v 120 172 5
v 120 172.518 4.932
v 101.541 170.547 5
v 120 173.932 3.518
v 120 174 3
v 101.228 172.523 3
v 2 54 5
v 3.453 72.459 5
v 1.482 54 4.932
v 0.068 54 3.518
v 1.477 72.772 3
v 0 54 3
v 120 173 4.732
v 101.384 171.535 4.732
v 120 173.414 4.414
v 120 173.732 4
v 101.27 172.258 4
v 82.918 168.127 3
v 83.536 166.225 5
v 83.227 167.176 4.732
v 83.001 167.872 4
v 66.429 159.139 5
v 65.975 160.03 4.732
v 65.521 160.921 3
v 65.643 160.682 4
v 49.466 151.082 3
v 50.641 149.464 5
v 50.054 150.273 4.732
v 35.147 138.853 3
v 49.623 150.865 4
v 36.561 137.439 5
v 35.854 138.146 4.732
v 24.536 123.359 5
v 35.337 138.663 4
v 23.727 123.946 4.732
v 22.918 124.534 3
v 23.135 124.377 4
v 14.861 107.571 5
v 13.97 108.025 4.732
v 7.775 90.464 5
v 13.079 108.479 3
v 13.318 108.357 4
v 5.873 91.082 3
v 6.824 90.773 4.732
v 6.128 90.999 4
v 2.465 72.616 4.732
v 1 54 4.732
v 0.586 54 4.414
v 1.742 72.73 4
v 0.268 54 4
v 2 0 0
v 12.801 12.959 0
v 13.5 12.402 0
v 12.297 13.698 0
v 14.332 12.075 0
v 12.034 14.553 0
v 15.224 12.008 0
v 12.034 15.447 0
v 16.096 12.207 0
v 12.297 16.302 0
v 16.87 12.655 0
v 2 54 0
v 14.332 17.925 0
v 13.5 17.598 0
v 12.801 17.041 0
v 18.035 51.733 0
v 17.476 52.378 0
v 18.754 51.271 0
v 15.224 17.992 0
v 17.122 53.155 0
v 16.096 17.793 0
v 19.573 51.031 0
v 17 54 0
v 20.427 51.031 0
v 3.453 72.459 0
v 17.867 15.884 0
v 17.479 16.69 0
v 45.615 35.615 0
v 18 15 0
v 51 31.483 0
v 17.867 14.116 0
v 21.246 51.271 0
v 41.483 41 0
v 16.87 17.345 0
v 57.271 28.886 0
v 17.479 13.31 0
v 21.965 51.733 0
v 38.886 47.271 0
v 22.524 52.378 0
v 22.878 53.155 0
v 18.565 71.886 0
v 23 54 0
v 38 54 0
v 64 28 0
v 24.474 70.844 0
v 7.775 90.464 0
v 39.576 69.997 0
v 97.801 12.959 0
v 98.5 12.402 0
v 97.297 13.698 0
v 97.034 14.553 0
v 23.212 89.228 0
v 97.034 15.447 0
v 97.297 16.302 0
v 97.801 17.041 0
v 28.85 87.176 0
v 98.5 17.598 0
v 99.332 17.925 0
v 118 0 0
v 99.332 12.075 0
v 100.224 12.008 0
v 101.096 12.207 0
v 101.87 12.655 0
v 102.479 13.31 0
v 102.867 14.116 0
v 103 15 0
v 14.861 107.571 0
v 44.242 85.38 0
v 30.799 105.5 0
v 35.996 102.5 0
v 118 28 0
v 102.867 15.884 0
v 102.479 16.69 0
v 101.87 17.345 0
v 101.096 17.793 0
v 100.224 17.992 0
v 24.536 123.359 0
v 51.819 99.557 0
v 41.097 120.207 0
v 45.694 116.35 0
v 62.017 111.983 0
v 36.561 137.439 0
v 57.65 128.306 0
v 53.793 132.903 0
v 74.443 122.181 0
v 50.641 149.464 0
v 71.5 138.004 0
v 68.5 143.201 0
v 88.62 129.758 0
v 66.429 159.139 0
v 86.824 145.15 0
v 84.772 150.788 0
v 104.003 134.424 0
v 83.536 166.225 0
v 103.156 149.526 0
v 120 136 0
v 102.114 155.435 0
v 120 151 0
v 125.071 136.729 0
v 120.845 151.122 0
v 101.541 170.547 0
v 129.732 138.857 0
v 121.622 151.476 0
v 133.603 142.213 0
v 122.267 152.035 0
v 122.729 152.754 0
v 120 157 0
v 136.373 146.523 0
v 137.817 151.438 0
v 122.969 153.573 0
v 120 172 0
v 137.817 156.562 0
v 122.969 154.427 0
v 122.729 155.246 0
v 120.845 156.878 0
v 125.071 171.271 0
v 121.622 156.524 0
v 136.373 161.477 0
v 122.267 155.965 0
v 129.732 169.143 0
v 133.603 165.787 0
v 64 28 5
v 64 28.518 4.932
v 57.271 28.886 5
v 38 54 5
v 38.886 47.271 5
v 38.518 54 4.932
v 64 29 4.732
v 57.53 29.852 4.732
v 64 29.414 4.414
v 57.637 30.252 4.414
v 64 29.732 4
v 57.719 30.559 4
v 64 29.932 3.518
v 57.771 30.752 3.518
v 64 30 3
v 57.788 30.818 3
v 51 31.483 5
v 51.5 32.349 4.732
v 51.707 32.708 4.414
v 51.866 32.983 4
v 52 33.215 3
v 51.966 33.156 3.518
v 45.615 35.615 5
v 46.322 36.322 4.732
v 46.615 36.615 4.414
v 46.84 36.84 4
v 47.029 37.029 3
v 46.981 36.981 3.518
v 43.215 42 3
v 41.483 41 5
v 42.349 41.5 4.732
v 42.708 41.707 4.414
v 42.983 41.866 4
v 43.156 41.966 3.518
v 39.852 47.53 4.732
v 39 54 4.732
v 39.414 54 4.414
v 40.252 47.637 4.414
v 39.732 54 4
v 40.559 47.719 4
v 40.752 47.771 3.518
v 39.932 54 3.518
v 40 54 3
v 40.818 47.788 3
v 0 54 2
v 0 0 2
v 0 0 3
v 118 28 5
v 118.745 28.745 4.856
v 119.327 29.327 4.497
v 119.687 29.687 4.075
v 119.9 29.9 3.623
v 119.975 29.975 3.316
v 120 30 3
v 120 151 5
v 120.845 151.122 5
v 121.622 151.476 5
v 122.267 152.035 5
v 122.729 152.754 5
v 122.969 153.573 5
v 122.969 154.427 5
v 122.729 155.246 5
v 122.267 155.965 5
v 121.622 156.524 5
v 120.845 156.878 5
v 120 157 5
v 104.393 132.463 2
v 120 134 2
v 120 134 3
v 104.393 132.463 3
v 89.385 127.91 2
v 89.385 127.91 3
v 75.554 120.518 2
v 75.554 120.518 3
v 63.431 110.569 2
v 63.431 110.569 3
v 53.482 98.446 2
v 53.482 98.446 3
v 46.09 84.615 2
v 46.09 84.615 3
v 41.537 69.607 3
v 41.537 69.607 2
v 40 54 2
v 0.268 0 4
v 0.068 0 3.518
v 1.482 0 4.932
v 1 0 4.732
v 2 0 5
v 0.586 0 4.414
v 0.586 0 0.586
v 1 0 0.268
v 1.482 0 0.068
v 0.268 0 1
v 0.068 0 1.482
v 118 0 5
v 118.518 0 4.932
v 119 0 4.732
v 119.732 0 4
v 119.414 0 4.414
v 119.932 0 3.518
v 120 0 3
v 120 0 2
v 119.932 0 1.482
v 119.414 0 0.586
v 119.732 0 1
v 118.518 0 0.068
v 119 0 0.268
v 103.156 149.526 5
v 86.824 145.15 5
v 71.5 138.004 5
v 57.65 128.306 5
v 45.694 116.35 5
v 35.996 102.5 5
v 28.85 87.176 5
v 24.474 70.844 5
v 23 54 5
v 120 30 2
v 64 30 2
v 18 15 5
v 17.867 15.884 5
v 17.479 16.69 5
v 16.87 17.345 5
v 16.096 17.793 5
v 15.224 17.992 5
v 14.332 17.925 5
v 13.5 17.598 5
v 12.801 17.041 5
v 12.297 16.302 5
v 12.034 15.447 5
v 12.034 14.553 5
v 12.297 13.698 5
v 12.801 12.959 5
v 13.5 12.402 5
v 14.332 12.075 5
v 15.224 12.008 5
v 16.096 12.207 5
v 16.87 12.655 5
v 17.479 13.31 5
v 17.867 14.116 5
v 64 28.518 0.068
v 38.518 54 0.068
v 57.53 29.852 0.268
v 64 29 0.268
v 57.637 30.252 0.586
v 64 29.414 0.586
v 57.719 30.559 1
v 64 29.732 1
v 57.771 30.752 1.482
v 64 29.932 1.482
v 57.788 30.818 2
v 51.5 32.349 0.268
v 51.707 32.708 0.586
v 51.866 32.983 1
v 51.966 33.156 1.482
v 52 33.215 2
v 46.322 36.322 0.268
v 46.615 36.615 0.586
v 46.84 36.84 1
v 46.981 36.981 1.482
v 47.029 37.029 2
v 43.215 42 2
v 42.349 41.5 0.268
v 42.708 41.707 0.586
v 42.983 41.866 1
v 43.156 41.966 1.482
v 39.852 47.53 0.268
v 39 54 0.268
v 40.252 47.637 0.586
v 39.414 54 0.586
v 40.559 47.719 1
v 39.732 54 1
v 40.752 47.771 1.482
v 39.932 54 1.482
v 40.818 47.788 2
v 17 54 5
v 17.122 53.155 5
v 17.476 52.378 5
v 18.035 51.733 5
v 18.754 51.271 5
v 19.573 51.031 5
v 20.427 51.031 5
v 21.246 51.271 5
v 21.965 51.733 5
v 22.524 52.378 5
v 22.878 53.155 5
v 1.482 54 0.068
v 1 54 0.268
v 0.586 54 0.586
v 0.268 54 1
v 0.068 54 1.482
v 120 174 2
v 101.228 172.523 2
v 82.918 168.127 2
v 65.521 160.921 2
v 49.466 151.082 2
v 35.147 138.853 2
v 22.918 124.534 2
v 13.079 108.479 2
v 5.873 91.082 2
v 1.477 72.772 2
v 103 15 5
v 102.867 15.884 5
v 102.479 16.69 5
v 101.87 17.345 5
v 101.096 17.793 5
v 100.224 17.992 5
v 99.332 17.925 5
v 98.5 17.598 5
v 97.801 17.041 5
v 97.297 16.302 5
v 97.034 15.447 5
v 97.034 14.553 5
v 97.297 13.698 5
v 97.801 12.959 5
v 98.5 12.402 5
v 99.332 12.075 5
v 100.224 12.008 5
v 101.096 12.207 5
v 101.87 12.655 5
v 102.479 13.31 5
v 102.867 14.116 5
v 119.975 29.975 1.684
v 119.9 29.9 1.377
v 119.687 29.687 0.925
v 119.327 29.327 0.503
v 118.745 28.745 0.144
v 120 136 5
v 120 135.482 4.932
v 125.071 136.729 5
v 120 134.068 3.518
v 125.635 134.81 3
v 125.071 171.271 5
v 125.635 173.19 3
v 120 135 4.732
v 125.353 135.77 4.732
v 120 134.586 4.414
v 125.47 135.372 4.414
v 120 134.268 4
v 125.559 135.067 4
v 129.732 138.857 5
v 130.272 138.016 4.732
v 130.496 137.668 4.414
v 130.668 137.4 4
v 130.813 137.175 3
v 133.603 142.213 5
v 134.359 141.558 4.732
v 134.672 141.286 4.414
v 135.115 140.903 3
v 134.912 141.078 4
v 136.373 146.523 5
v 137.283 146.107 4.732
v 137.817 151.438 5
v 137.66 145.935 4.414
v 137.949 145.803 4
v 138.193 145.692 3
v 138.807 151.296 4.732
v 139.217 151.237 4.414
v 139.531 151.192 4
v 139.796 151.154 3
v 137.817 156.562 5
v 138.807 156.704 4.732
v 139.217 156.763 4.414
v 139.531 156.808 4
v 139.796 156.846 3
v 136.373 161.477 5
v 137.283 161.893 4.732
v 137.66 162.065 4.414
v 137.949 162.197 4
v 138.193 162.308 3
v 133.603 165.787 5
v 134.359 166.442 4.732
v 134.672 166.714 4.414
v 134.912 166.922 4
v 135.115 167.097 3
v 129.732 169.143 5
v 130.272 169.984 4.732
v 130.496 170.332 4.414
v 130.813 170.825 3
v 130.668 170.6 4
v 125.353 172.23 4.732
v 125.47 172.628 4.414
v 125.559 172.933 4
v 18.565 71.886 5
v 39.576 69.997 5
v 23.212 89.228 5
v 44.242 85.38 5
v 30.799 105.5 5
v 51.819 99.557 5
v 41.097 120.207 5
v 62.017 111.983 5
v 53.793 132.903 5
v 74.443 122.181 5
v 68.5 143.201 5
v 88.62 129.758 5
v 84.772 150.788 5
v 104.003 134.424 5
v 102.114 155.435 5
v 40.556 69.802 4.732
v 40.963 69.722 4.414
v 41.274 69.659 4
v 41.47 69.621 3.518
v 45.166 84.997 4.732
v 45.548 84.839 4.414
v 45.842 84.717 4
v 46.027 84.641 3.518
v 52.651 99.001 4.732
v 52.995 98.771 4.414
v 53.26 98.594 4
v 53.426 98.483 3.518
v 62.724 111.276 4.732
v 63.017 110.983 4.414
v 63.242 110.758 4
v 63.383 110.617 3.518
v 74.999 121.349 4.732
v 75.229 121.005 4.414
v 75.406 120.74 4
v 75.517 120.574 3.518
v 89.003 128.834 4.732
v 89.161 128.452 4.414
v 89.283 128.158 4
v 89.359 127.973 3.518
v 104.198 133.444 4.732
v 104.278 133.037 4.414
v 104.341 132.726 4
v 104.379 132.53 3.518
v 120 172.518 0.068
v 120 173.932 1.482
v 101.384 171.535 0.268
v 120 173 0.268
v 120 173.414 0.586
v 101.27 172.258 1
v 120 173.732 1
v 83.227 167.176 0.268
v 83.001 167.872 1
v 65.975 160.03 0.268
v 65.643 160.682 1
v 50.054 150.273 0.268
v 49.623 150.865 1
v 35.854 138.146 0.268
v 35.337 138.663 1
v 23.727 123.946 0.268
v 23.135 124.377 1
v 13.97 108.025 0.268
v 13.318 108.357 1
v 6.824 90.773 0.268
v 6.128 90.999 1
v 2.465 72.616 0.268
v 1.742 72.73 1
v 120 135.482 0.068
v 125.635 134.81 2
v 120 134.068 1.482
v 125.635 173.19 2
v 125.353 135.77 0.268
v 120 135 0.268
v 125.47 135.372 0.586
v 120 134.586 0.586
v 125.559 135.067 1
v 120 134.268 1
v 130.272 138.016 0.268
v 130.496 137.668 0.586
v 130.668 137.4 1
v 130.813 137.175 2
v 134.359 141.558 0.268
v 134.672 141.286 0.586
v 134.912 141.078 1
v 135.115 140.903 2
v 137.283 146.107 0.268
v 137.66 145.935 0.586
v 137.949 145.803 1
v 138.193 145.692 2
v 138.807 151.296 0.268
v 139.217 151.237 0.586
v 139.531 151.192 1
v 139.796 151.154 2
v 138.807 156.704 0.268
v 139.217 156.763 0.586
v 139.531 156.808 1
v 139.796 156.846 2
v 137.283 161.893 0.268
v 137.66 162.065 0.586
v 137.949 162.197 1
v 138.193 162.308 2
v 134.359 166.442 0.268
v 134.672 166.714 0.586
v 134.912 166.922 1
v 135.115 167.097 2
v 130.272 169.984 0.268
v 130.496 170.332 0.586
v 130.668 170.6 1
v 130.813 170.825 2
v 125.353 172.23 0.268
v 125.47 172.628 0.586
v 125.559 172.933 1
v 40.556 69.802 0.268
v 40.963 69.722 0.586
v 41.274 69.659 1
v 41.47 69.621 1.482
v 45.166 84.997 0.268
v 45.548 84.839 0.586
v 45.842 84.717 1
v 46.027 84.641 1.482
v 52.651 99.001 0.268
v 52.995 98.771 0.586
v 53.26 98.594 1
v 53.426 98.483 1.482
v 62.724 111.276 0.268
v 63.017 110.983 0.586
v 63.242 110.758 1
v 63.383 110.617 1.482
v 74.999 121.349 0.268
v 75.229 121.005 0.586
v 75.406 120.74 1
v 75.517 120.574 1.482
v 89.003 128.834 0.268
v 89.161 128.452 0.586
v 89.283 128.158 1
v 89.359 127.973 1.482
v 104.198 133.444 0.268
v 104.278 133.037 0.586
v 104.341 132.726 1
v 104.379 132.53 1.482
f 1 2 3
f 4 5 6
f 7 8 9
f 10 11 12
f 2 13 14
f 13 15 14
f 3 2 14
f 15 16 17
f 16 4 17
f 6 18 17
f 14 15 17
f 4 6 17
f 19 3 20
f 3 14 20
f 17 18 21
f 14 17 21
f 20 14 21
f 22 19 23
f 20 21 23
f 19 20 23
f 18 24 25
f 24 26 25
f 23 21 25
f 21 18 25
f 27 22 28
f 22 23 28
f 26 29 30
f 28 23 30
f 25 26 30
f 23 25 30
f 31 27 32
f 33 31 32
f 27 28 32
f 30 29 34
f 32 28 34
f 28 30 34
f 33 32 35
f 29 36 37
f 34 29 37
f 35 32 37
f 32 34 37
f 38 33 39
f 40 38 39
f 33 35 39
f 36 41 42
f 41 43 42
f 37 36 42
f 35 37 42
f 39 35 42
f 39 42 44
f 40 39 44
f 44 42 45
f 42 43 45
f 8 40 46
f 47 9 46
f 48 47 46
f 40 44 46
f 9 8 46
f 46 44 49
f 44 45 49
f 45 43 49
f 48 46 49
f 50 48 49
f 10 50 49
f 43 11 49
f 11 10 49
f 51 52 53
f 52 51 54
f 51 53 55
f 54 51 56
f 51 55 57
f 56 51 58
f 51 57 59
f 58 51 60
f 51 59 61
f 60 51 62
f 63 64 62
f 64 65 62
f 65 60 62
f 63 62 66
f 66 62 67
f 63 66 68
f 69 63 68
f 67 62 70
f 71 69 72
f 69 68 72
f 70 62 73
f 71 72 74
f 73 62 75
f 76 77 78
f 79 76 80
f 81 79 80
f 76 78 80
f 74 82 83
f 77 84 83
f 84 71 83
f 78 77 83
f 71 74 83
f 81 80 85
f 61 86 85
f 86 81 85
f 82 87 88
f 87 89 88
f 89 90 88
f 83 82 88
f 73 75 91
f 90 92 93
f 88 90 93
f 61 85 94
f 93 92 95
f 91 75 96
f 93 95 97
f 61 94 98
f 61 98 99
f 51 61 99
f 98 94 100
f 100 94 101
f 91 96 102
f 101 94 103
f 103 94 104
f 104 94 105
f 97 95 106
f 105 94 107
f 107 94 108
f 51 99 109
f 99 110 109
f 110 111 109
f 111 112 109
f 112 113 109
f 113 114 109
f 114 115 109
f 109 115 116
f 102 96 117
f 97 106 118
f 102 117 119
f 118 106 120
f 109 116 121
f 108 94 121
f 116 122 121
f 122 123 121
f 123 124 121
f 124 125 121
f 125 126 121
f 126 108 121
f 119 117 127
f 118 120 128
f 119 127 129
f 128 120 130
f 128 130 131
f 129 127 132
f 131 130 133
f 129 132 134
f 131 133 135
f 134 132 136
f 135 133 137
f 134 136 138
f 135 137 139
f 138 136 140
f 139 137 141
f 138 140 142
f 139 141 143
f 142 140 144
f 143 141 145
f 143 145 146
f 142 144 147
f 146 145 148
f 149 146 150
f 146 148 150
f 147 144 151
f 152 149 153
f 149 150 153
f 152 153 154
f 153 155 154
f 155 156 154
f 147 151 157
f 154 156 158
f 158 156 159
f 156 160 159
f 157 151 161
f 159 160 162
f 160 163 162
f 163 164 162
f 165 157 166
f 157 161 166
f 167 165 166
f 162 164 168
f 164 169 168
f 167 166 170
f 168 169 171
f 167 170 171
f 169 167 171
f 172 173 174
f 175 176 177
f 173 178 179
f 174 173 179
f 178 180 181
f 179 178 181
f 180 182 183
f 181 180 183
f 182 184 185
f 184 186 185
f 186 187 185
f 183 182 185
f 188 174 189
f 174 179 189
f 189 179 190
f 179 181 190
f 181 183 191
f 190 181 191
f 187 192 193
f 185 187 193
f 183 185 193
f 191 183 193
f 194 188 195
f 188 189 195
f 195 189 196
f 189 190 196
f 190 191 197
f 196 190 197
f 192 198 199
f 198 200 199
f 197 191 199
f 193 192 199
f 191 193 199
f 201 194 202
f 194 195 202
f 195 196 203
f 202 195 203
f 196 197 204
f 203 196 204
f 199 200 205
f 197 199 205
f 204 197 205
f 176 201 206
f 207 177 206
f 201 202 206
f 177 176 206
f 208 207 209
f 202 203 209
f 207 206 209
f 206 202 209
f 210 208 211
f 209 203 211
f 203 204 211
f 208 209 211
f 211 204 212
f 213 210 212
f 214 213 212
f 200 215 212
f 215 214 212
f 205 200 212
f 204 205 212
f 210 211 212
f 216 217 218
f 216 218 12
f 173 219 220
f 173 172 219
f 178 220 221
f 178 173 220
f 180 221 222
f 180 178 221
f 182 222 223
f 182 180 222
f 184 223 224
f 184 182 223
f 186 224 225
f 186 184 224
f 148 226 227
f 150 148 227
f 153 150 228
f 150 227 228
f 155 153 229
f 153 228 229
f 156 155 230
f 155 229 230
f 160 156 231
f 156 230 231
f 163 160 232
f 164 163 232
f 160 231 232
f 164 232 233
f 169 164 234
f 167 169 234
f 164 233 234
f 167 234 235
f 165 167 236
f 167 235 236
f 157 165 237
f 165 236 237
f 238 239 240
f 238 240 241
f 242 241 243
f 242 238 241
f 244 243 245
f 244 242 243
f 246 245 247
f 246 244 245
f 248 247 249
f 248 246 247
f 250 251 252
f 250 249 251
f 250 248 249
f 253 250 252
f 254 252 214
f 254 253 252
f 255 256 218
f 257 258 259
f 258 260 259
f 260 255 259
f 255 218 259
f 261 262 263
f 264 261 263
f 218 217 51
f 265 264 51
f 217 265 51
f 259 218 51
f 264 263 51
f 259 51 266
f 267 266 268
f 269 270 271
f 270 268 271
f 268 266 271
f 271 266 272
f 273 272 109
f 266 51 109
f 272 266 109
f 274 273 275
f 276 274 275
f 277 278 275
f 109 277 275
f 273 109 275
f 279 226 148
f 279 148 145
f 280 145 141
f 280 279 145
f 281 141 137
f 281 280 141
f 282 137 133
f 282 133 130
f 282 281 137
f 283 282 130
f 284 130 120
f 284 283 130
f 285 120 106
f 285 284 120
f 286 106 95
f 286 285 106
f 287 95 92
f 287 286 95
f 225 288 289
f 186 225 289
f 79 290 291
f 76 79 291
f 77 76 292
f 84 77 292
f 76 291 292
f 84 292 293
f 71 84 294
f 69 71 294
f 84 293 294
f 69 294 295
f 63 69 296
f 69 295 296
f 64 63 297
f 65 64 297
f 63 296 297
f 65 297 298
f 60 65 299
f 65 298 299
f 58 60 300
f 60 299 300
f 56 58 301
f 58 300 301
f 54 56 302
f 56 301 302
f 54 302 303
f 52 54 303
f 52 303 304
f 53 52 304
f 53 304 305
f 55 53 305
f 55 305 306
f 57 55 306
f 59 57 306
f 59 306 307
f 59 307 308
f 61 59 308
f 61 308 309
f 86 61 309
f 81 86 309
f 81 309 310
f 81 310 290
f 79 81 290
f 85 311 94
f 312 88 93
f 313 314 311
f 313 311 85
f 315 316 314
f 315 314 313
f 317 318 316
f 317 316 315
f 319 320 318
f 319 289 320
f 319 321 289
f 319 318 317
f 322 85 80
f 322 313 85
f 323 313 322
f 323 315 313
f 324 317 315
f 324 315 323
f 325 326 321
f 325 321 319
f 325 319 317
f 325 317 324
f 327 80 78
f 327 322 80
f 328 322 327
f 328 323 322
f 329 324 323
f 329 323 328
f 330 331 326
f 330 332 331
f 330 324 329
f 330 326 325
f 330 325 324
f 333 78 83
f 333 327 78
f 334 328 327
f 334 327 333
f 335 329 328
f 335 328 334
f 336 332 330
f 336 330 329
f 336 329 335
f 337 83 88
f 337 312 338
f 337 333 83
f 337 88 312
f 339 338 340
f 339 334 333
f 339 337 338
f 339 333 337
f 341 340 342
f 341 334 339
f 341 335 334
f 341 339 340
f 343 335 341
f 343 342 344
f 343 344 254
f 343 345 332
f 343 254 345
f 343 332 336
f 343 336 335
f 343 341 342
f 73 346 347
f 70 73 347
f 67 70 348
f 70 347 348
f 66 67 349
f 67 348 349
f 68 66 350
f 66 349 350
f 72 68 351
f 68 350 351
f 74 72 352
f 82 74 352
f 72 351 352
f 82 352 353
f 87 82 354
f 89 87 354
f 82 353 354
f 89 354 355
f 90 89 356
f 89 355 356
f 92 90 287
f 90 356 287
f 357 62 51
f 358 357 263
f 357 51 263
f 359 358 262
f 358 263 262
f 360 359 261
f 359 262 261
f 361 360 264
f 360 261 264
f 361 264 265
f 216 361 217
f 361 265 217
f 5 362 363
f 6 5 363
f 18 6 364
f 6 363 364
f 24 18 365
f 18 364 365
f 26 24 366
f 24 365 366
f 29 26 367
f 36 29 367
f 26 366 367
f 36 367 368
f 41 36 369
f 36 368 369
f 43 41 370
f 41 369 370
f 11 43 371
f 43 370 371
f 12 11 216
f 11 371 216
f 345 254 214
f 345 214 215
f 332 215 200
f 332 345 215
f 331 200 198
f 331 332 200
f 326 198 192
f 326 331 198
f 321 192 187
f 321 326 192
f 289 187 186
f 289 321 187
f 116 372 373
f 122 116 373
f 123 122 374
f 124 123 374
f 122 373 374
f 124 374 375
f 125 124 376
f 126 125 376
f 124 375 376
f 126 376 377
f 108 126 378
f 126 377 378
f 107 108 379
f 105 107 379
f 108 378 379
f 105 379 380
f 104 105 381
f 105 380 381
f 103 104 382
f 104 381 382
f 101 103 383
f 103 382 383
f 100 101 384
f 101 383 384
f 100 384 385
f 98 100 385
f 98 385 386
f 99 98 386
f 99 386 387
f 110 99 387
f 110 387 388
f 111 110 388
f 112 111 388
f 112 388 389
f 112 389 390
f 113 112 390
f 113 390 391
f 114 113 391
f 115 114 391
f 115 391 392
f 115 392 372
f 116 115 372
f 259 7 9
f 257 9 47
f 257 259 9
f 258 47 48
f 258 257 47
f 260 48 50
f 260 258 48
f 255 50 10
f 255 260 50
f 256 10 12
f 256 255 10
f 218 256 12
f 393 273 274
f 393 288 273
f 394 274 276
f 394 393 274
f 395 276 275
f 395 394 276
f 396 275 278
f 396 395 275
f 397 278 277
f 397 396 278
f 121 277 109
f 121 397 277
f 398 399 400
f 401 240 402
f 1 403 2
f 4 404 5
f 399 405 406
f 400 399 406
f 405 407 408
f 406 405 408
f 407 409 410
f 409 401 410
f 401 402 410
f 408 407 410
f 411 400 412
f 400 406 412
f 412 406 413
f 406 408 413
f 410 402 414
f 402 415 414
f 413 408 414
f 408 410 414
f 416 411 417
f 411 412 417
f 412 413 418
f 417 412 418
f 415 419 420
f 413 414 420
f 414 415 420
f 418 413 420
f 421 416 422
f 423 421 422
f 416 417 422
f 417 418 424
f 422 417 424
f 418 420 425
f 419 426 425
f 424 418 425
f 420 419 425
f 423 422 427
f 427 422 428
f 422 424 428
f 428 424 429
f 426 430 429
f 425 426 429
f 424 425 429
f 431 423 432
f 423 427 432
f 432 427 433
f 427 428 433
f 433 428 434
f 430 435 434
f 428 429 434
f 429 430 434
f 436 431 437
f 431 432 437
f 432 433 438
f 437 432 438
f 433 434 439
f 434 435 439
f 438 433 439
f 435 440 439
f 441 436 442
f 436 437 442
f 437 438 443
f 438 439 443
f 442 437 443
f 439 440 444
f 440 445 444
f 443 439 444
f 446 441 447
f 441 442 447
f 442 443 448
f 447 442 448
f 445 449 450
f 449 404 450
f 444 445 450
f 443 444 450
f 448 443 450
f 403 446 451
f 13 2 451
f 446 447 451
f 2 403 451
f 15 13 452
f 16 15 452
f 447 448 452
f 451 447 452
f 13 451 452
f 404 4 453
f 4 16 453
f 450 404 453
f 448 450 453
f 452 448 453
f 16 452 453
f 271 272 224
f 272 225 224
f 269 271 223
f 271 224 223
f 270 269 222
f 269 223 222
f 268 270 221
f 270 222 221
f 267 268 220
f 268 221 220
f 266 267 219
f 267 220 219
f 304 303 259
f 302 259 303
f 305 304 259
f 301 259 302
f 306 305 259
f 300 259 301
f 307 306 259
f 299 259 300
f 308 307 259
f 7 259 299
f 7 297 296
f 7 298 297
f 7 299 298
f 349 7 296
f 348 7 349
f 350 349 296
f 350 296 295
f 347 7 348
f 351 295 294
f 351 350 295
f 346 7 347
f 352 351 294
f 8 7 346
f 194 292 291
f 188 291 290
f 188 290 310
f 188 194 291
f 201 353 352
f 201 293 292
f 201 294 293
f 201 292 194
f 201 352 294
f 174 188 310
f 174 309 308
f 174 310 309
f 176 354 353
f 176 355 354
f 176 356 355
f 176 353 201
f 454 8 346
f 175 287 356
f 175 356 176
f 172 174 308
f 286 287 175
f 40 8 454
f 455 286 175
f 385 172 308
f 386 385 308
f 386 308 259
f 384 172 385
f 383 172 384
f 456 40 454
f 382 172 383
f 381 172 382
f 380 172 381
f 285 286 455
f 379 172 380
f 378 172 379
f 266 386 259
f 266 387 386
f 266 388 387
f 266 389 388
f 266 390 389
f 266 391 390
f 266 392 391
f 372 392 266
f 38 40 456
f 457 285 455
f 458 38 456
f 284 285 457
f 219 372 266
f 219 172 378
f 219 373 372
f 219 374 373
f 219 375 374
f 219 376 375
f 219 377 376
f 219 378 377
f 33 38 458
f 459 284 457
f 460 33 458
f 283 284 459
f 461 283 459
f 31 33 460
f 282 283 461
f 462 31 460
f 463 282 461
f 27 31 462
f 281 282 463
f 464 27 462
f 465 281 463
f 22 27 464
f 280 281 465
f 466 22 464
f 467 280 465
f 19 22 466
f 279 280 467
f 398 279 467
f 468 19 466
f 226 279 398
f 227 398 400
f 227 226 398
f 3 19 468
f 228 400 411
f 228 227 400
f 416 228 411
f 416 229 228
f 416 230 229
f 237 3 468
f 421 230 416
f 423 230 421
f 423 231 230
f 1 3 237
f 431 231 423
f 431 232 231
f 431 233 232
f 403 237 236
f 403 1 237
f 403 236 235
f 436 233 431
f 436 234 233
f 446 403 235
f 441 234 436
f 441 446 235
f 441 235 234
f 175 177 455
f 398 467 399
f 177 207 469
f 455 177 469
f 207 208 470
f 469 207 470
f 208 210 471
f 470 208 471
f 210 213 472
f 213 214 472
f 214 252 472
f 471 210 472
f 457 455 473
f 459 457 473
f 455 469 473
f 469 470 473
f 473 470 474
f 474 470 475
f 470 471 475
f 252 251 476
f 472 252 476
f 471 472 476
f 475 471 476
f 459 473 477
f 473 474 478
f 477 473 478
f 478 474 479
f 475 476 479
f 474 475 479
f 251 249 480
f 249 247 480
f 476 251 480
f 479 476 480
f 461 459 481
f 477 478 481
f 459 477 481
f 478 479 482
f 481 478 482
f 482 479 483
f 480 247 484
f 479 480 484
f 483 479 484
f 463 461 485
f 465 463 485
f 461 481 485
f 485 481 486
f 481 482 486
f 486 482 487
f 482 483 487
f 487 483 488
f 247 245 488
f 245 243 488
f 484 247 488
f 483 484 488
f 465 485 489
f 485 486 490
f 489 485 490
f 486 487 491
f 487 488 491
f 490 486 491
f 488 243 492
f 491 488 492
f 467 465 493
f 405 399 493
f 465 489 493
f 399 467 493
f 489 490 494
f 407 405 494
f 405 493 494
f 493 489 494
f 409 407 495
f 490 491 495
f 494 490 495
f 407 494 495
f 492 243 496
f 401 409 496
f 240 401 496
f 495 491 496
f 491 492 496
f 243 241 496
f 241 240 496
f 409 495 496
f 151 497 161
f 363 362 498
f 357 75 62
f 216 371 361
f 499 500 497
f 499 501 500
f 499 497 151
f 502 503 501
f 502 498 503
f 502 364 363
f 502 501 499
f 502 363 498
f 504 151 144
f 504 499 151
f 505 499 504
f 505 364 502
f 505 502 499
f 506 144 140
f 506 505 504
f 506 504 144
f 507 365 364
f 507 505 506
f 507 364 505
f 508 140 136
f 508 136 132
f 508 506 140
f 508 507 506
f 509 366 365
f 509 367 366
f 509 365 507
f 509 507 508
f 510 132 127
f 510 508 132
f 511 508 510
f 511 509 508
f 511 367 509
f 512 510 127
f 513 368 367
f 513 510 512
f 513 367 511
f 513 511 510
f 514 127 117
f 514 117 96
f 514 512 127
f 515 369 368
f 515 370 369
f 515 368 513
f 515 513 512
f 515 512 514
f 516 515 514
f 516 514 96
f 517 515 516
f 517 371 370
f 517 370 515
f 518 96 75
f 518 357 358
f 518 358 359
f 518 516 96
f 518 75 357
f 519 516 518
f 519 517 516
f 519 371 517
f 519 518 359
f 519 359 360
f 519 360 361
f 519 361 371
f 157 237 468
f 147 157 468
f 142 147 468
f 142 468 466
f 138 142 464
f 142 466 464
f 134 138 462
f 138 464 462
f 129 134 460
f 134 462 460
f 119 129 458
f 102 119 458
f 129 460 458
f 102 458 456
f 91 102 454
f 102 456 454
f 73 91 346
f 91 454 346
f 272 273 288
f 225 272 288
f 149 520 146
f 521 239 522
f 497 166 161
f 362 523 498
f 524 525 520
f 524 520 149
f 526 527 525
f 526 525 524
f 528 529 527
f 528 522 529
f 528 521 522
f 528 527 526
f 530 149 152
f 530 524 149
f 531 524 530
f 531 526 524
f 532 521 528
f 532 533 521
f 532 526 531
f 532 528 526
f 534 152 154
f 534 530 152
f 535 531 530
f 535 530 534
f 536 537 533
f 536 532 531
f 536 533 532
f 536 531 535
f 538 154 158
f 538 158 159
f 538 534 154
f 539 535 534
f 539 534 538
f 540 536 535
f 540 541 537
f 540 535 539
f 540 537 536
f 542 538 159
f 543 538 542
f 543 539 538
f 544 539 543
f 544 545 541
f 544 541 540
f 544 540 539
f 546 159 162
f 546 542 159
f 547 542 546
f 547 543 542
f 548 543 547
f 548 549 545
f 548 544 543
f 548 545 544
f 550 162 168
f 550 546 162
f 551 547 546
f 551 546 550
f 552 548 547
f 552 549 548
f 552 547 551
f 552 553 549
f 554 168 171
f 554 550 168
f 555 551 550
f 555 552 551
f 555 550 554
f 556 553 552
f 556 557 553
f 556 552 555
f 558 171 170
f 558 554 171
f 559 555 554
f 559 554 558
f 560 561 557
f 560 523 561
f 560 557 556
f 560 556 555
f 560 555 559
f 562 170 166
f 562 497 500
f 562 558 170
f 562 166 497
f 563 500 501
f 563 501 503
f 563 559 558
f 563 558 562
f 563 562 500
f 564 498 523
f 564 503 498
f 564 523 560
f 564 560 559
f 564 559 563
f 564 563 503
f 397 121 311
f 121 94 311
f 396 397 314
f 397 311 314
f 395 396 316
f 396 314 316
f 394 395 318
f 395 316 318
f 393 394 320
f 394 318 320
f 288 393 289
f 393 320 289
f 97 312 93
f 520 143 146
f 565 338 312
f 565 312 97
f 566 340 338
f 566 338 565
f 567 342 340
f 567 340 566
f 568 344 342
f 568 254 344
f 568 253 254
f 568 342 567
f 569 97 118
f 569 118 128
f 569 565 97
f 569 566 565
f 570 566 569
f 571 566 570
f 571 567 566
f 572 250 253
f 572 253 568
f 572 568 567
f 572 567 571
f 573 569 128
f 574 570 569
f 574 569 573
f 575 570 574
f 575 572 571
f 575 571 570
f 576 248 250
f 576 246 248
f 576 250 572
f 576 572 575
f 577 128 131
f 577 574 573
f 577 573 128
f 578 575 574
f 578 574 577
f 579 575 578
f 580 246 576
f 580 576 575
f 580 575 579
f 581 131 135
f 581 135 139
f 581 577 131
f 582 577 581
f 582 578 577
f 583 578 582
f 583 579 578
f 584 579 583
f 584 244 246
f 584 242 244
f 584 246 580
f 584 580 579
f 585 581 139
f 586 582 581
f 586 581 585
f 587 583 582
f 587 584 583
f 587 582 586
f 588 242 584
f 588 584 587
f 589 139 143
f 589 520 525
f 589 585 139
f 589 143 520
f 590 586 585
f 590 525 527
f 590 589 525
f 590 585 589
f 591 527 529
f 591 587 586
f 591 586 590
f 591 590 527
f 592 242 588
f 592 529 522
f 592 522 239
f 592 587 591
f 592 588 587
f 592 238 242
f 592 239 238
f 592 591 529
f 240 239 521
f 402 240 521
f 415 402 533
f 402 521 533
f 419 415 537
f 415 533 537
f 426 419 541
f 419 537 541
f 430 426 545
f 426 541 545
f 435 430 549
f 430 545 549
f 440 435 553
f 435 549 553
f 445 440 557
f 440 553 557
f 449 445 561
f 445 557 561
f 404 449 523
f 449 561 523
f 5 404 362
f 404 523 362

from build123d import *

# Parameters (mm, degrees)
PAD_DEPTH    = 5
SKETCH001_R  = 3
HOLE_DEPTH   = 5.001
POCKET_DEPTH = 5.001
FILLET_R     = 2


with BuildPart() as part:
    # Sketch → Pad (new body)
    with BuildSketch(Plane.XY):
        with BuildLine():
            Line((0, 0), (120, 0))
            Line((120, 0), (120, 30))
            Line((120, 30), (64, 30))
            ThreePointArc((40, 54), (47.029437, 37.029437), (64, 30))
            ThreePointArc((120, 134), (63.431458, 110.568542), (40, 54))
            ThreePointArc((120, 134), (140, 154), (120, 174))
            ThreePointArc((120, 174), (35.147186, 138.852814), (0, 54))
            Line((0, 0), (0, 54))
        make_face()
    extrude(amount=PAD_DEPTH)

    # Sketch001 (on Face10 of Pad) → Hole (cut, through all)
    with BuildSketch(Plane.XY.offset(5)):
        with Locations((15, 15)):
            Circle(SKETCH001_R)
        with Locations((100, 15)):
            Circle(SKETCH001_R)
    extrude(amount=-HOLE_DEPTH, mode=Mode.SUBTRACT)

    # Sketch002 (on Face5 of Hole) → Pocket (cut, through all)
    with BuildSketch(Plane.XY.offset(5)):
        with BuildLine():
            ThreePointArc((120, 157), (47.168002, 126.831998), (17, 54))
            ThreePointArc((17, 54), (20, 51), (23, 54))
            ThreePointArc((120, 151), (51.410642, 122.589358), (23, 54))
            ThreePointArc((120, 151), (123, 154), (120, 157))
        make_face()
    extrude(amount=-POCKET_DEPTH, mode=Mode.SUBTRACT)

    # Fillet
    fillet_edges = [part.edges().sort_by_distance(p)[0] for p in [
        (92, 30, 5),
        (92, 30, 0),
        (47.029437, 37.029437, 5),
        (63.431458, 110.568542, 5),
        (140, 154, 5),
        (35.147186, 138.852814, 5),
        (0, 27, 5),
        (47.029437, 37.029437, 0),
        (63.431458, 110.568542, 0),
        (140, 154, 0),
        (35.147186, 138.852814, 0),
        (0, 27, 0),
        (120, 15, 0),
        (120, 15, 5),
    ]]
    fillet(fillet_edges, radius=FILLET_R)


solid = part.part
